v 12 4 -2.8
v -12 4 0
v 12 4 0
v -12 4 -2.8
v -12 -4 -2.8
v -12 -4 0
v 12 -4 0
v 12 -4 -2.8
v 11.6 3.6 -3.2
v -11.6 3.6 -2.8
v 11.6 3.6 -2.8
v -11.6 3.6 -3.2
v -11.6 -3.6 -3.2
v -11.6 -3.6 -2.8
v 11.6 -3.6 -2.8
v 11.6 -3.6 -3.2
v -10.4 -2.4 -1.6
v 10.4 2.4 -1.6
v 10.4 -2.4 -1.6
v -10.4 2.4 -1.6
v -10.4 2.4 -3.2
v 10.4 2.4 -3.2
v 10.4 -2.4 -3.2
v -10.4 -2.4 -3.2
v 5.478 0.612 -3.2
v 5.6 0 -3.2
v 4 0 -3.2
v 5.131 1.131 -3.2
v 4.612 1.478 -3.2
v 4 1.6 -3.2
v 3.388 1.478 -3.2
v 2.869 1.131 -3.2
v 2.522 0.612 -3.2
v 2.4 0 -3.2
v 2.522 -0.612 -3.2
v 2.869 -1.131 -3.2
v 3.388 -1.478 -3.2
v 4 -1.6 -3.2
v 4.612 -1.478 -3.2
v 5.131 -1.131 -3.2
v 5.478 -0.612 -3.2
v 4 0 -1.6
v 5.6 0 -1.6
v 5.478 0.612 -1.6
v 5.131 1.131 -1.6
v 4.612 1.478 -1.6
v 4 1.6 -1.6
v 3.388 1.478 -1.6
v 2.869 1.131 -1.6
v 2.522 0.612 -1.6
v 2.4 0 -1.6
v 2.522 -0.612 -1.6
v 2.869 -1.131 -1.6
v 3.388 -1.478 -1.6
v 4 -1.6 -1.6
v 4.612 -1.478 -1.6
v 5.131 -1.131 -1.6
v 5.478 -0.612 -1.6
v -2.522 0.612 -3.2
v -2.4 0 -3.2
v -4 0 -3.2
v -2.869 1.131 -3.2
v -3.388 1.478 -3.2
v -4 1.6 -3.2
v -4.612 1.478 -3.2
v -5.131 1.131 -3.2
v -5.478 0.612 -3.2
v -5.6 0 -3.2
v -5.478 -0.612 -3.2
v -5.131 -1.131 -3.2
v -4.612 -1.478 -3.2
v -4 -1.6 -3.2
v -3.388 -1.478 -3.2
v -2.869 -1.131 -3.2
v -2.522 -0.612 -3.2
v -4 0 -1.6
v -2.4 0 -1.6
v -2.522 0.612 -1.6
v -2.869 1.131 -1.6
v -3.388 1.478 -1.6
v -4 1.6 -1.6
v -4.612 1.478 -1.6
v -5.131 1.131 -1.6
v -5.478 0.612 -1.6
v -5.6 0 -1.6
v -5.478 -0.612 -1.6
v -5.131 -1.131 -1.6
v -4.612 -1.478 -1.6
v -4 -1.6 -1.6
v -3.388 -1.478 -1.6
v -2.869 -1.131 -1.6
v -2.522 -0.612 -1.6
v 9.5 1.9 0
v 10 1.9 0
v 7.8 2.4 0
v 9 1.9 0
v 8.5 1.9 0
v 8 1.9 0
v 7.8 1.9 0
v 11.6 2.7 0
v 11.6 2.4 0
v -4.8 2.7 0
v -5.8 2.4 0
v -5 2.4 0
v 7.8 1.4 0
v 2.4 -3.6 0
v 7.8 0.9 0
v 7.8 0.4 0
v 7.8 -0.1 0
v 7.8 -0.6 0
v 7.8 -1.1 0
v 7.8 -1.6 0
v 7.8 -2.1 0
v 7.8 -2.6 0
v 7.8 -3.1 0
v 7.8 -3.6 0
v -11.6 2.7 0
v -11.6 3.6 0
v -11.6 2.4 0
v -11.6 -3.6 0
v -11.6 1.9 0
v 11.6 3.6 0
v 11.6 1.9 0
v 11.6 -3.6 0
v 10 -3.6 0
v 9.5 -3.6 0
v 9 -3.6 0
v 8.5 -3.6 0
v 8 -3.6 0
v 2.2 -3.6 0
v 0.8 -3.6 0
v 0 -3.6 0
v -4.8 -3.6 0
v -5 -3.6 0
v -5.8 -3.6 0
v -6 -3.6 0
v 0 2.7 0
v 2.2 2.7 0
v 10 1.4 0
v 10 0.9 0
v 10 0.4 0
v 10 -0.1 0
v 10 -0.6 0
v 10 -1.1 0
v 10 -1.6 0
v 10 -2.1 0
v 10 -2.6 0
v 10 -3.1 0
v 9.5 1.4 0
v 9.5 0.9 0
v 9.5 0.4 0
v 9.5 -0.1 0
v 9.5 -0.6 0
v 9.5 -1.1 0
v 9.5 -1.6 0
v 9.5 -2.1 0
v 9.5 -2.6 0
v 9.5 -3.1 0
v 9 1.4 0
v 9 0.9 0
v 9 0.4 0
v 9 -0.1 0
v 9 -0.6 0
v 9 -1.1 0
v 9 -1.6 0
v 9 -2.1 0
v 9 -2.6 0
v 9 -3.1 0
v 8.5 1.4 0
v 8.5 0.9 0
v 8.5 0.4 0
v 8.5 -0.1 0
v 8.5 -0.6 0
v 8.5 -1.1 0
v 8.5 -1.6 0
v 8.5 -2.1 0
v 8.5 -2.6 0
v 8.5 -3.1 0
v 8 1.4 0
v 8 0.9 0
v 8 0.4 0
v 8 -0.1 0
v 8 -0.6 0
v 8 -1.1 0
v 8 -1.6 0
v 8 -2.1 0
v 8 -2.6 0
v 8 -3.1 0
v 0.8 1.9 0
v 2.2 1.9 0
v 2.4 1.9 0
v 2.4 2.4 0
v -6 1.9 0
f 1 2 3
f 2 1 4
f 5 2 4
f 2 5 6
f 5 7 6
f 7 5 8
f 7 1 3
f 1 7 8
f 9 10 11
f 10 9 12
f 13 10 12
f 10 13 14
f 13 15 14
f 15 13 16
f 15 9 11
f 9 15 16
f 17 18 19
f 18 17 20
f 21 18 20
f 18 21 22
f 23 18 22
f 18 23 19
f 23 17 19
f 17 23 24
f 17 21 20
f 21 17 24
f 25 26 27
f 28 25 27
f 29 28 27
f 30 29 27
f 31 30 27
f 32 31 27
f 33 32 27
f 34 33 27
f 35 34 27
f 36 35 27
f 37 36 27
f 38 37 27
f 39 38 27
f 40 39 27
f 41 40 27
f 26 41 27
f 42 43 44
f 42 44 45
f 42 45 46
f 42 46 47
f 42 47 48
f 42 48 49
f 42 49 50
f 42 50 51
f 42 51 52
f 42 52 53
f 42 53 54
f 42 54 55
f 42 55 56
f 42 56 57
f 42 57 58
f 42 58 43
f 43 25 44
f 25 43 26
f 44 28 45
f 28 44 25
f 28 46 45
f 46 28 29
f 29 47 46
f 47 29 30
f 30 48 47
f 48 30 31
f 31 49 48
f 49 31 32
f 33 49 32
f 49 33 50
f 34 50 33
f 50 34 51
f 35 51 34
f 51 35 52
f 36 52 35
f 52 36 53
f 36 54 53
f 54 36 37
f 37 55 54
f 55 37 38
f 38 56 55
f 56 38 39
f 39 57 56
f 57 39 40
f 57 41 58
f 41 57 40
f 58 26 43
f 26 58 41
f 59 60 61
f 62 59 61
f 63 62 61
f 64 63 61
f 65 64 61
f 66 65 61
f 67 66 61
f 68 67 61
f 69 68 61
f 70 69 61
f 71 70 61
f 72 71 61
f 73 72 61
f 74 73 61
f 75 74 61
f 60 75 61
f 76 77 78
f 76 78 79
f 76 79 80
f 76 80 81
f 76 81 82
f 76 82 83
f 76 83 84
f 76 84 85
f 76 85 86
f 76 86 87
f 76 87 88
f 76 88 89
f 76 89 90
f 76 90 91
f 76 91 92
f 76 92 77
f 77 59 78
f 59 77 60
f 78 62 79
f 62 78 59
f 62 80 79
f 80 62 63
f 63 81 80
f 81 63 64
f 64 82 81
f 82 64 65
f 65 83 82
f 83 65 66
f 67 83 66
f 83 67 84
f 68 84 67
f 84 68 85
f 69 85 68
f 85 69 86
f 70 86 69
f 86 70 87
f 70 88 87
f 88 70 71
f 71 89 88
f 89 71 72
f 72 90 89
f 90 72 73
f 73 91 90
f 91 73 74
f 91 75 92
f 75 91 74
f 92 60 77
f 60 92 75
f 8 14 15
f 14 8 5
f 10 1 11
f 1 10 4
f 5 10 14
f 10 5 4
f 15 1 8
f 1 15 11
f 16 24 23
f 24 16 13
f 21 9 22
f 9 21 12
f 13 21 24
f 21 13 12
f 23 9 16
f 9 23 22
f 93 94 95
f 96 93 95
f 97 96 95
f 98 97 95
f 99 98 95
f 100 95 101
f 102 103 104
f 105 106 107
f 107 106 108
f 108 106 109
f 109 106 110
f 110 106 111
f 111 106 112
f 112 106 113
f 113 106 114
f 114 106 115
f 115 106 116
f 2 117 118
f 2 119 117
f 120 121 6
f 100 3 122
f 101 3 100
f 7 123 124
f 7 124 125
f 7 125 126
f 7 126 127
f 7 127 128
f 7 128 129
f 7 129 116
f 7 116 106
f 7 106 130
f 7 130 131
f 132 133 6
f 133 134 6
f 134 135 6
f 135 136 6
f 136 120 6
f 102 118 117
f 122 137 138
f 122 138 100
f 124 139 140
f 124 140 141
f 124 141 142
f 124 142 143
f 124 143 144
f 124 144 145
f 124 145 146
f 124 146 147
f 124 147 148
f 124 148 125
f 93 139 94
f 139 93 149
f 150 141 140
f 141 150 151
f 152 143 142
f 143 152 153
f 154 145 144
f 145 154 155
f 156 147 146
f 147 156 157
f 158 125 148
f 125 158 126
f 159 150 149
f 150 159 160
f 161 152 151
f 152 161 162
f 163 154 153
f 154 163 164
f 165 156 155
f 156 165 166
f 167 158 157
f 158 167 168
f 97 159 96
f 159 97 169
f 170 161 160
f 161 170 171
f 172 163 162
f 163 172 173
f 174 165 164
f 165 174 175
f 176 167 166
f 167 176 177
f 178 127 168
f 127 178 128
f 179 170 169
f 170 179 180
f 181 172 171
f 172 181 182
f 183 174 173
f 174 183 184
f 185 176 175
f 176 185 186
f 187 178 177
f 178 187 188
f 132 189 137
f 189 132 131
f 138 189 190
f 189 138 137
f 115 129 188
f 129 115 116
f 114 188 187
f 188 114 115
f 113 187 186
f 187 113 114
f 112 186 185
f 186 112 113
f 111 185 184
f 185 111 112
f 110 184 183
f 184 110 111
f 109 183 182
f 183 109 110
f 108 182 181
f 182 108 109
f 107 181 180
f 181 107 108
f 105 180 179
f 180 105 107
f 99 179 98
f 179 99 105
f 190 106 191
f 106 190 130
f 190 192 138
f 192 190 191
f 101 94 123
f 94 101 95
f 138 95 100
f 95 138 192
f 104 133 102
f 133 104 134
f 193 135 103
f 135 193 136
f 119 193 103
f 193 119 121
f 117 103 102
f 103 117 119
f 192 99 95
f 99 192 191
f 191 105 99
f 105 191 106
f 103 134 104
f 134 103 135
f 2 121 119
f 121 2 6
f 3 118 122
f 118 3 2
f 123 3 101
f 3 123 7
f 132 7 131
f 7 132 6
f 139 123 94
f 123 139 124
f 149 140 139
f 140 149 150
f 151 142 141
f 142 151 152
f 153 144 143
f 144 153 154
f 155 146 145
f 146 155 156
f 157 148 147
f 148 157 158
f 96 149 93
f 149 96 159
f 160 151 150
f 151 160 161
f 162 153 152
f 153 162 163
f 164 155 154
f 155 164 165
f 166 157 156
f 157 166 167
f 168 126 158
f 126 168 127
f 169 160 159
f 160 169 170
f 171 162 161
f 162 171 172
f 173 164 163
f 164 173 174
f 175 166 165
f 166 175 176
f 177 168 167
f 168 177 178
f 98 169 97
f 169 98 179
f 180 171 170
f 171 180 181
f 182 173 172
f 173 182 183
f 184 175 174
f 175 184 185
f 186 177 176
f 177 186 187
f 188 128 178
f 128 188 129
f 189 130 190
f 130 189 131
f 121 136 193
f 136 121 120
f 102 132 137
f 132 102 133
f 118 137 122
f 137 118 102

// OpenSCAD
// file: ../p/4-4edge.scad
use <../lib.scad>
function ldraw_lib__4_4edge() = [
// 0 Circle 1.0
// 0 Name: 4-4edge.dat
// 0 Author: James Jessiman
// 0 !LDRAW_ORG Primitive UPDATE 2017-01
// 0 !LICENSE Licensed under CC BY 2.0 and CC BY 4.0 : see CAreadme.txt
// 
// 0 BFC CERTIFY CCW
  [0,"BFC","CERTIFY"],
  [0,"BFC","CCW"],
// 
// 0 !HISTORY 1998-12-15 [PTadmin] Official Update 1998-10
// 0 !HISTORY 2005-12-28 [PTadmin] Official Update 2005-01
// 0 !HISTORY 2007-06-24 [PTadmin] Header formatted for Contributor Agreement
// 0 !HISTORY 2008-07-01 [PTadmin] Official Update 2008-01
// 0 !HISTORY 2017-01-15 [Steffen] BFCed
// 0 !HISTORY 2017-12-30 [PTadmin] Official Update 2017-01
// 
// 
// 2 24 1 0 0 0.9239 0 0.3827
  [2,24,1,0,0,0.9239,0,0.3827],
// 2 24 0.9239 0 0.3827 0.7071 0 0.7071
  [2,24,0.9239,0,0.3827,0.7071,0,0.7071],
// 2 24 0.7071 0 0.7071 0.3827 0 0.9239
  [2,24,0.7071,0,0.7071,0.3827,0,0.9239],
// 2 24 0.3827 0 0.9239 0 0 1
  [2,24,0.3827,0,0.9239,0,0,1],
// 2 24 0 0 1 -0.3827 0 0.9239
  [2,24,0,0,1,-0.3827,0,0.9239],
// 2 24 -0.3827 0 0.9239 -0.7071 0 0.7071
  [2,24,-0.3827,0,0.9239,-0.7071,0,0.7071],
// 2 24 -0.7071 0 0.7071 -0.9239 0 0.3827
  [2,24,-0.7071,0,0.7071,-0.9239,0,0.3827],
// 2 24 -0.9239 0 0.3827 -1 0 -0
  [2,24,-0.9239,0,0.3827,-1,0,-0],
// 2 24 -1 0 -0 -0.9239 0 -0.3827
  [2,24,-1,0,-0,-0.9239,0,-0.3827],
// 2 24 -0.9239 0 -0.3827 -0.7071 0 -0.7071
  [2,24,-0.9239,0,-0.3827,-0.7071,0,-0.7071],
// 2 24 -0.7071 0 -0.7071 -0.3827 0 -0.9239
  [2,24,-0.7071,0,-0.7071,-0.3827,0,-0.9239],
// 2 24 -0.3827 0 -0.9239 0 0 -1
  [2,24,-0.3827,0,-0.9239,0,0,-1],
// 2 24 0 0 -1 0.3827 0 -0.9239
  [2,24,0,0,-1,0.3827,0,-0.9239],
// 2 24 0.3827 0 -0.9239 0.7071 0 -0.7071
  [2,24,0.3827,0,-0.9239,0.7071,0,-0.7071],
// 2 24 0.7071 0 -0.7071 0.9239 0 -0.3827
  [2,24,0.7071,0,-0.7071,0.9239,0,-0.3827],
// 2 24 0.9239 0 -0.3827 1 0 0
  [2,24,0.9239,0,-0.3827,1,0,0],
];
module ldraw_lib__4_4edge(step=0, col=false, unit=2/5, alt=false, line=0.2, solid=!$preview)
    makepoly(ldraw_lib__4_4edge(), step=step, col=col, unit=unit, alt=alt, line=line, solid=solid);
ldraw_lib__4_4edge(line=0.2);
// file: ../p/4-4disc.scad
use <../lib.scad>
function ldraw_lib__4_4disc() = [
// 0 Disc 1.0
// 0 Name: 4-4disc.dat
// 0 Author: James Jessiman
// 0 !LDRAW_ORG Primitive UPDATE 2002-02
// 0 !LICENSE Licensed under CC BY 2.0 and CC BY 4.0 : see CAreadme.txt
// 
// 0 BFC CERTIFY CCW
  [0,"BFC","CERTIFY"],
  [0,"BFC","CCW"],
// 
// 0 !HISTORY 1998-12-15 [PTadmin] Official Update 1998-10
// 0 !HISTORY 2002-03-23 [sbliss] Added BFC statement
// 0 !HISTORY 2002-04-25 [PTadmin] Official Update 2002-02
// 0 !HISTORY 2007-06-24 [PTadmin] Header formatted for Contributor Agreement
// 0 !HISTORY 2008-07-01 [PTadmin] Official Update 2008-01
// 
// 
// 3 16 0 0 0 1 0 0 0.9239 0 0.3827
  [3,16,0,0,0,1,0,0,0.9239,0,0.3827],
// 3 16 0 0 0 0.9239 0 0.3827 0.7071 0 0.7071
  [3,16,0,0,0,0.9239,0,0.3827,0.7071,0,0.7071],
// 3 16 0 0 0 0.7071 0 0.7071 0.3827 0 0.9239
  [3,16,0,0,0,0.7071,0,0.7071,0.3827,0,0.9239],
// 3 16 0 0 0 0.3827 0 0.9239 0 0 1
  [3,16,0,0,0,0.3827,0,0.9239,0,0,1],
// 3 16 0 0 0 0 0 1 -0.3827 0 0.9239
  [3,16,0,0,0,0,0,1,-0.3827,0,0.9239],
// 3 16 0 0 0 -0.3827 0 0.9239 -0.7071 0 0.7071
  [3,16,0,0,0,-0.3827,0,0.9239,-0.7071,0,0.7071],
// 3 16 0 0 0 -0.7071 0 0.7071 -0.9239 0 0.3827
  [3,16,0,0,0,-0.7071,0,0.7071,-0.9239,0,0.3827],
// 3 16 0 0 0 -0.9239 0 0.3827 -1 0 -0
  [3,16,0,0,0,-0.9239,0,0.3827,-1,0,-0],
// 3 16 0 0 0 -1 0 -0 -0.9239 0 -0.3827
  [3,16,0,0,0,-1,0,-0,-0.9239,0,-0.3827],
// 3 16 0 0 0 -0.9239 0 -0.3827 -0.7071 0 -0.7071
  [3,16,0,0,0,-0.9239,0,-0.3827,-0.7071,0,-0.7071],
// 3 16 0 0 0 -0.7071 0 -0.7071 -0.3827 0 -0.9239
  [3,16,0,0,0,-0.7071,0,-0.7071,-0.3827,0,-0.9239],
// 3 16 0 0 0 -0.3827 0 -0.9239 0 0 -1
  [3,16,0,0,0,-0.3827,0,-0.9239,0,0,-1],
// 3 16 0 0 0 0 0 -1 0.3827 0 -0.9239
  [3,16,0,0,0,0,0,-1,0.3827,0,-0.9239],
// 3 16 0 0 0 0.3827 0 -0.9239 0.7071 0 -0.7071
  [3,16,0,0,0,0.3827,0,-0.9239,0.7071,0,-0.7071],
// 3 16 0 0 0 0.7071 0 -0.7071 0.9239 0 -0.3827
  [3,16,0,0,0,0.7071,0,-0.7071,0.9239,0,-0.3827],
// 3 16 0 0 0 0.9239 0 -0.3827 1 0 0
  [3,16,0,0,0,0.9239,0,-0.3827,1,0,0],
// 0
];
module ldraw_lib__4_4disc(step=0, col=false, unit=2/5, alt=false, line=0.2, solid=!$preview)
    makepoly(ldraw_lib__4_4disc(), step=step, col=col, unit=unit, alt=alt, line=line, solid=solid);
ldraw_lib__4_4disc(line=0.2);
// file: ../p/4-4cyli.scad
use <../lib.scad>
$fa=1; $fs=0.2;
function ldraw_lib__4_4cyli(realsolid=false) = [
// 0 Cylinder 1.0
// 0 Name: 4-4cyli.dat
// 0 Author: James Jessiman
// 0 !LDRAW_ORG Primitive UPDATE 2005-01
// 0 !LICENSE Licensed under CC BY 2.0 and CC BY 4.0 : see CAreadme.txt
// 
// 0 BFC CERTIFY CCW
  [0,"BFC","CERTIFY"],
  [0,"BFC","CCW"],
// 
// 0 !HISTORY 1998-12-15 [PTadmin] Official Update 1998-10
// 0 !HISTORY 2002-03-23 [sbliss] Added BFC statement; merged headers from files in distributions LDraw 0.27 and Complete.
// 0 !HISTORY 2002-04-25 [PTadmin] Official Update 2002-02
// 0 !HISTORY 2004-12-14 [guyvivan] BFC CCW
// 0 !HISTORY 2005-12-28 [PTadmin] Official Update 2005-01
// 0 !HISTORY 2007-06-24 [PTadmin] Header formatted for Contributor Agreement
// 0 !HISTORY 2008-07-01 [PTadmin] Official Update 2008-01
// 
// 
// 4 16 1 1 0 0.9239 1 0.3827 0.9239 0 0.3827 1 0 0
  [4,16,1,1,0,0.9239,1,0.3827,0.9239,0,0.3827,1,0,0],
// 5 24 1 0 0 1 1 0 0.9239 0 0.3827 0.9239 0 -0.3827
  [5,24,1,0,0,1,1,0,0.9239,0,0.3827,0.9239,0,-0.3827],
// 4 16 0.9239 1 0.3827 0.7071 1 0.7071 0.7071 0 0.7071 0.9239 0 0.3827
  [4,16,0.9239,1,0.3827,0.7071,1,0.7071,0.7071,0,0.7071,0.9239,0,0.3827],
// 5 24 0.9239 0 0.3827 0.9239 1 0.3827 0.7071 0 0.7071 1 0 0
  [5,24,0.9239,0,0.3827,0.9239,1,0.3827,0.7071,0,0.7071,1,0,0],
// 4 16 0.7071 1 0.7071 0.3827 1 0.9239 0.3827 0 0.9239 0.7071 0 0.7071
  [4,16,0.7071,1,0.7071,0.3827,1,0.9239,0.3827,0,0.9239,0.7071,0,0.7071],
// 5 24 0.7071 0 0.7071 0.7071 1 0.7071 0.3827 0 0.9239 0.9239 0 0.3827
  [5,24,0.7071,0,0.7071,0.7071,1,0.7071,0.3827,0,0.9239,0.9239,0,0.3827],
// 4 16 0.3827 1 0.9239 0 1 1 0 0 1 0.3827 0 0.9239
  [4,16,0.3827,1,0.9239,0,1,1,0,0,1,0.3827,0,0.9239],
// 5 24 0.3827 0 0.9239 0.3827 1 0.9239 0 0 1 0.7071 0 0.7071
  [5,24,0.3827,0,0.9239,0.3827,1,0.9239,0,0,1,0.7071,0,0.7071],
// 4 16 0 1 1 -0.3827 1 0.9239 -0.3827 0 0.9239 0 0 1
  [4,16,0,1,1,-0.3827,1,0.9239,-0.3827,0,0.9239,0,0,1],
// 5 24 0 0 1 0 1 1 -0.3827 0 0.9239 0.3827 0 0.9239
  [5,24,0,0,1,0,1,1,-0.3827,0,0.9239,0.3827,0,0.9239],
// 4 16 -0.3827 1 0.9239 -0.7071 1 0.7071 -0.7071 0 0.7071 -0.3827 0 0.9239
  [4,16,-0.3827,1,0.9239,-0.7071,1,0.7071,-0.7071,0,0.7071,-0.3827,0,0.9239],
// 5 24 -0.3827 0 0.9239 -0.3827 1 0.9239 -0.7071 0 0.7071 0 0 1
  [5,24,-0.3827,0,0.9239,-0.3827,1,0.9239,-0.7071,0,0.7071,0,0,1],
// 4 16 -0.7071 1 0.7071 -0.9239 1 0.3827 -0.9239 0 0.3827 -0.7071 0 0.7071
  [4,16,-0.7071,1,0.7071,-0.9239,1,0.3827,-0.9239,0,0.3827,-0.7071,0,0.7071],
// 5 24 -0.7071 0 0.7071 -0.7071 1 0.7071 -0.9239 0 0.3827 -0.3827 0 0.9239
  [5,24,-0.7071,0,0.7071,-0.7071,1,0.7071,-0.9239,0,0.3827,-0.3827,0,0.9239],
// 4 16 -0.9239 1 0.3827 -1 1 0 -1 0 0 -0.9239 0 0.3827
  [4,16,-0.9239,1,0.3827,-1,1,0,-1,0,0,-0.9239,0,0.3827],
// 5 24 -0.9239 0 0.3827 -0.9239 1 0.3827 -1 0 0 -0.7071 0 0.7071
  [5,24,-0.9239,0,0.3827,-0.9239,1,0.3827,-1,0,0,-0.7071,0,0.7071],
// 4 16 -1 1 0 -0.9239 1 -0.3827 -0.9239 0 -0.3827 -1 0 0
  [4,16,-1,1,0,-0.9239,1,-0.3827,-0.9239,0,-0.3827,-1,0,0],
// 5 24 -1 0 0 -1 1 0 -0.9239 0 -0.3827 -0.9239 0 0.3827
  [5,24,-1,0,0,-1,1,0,-0.9239,0,-0.3827,-0.9239,0,0.3827],
// 4 16 -0.9239 1 -0.3827 -0.7071 1 -0.7071 -0.7071 0 -0.7071 -0.9239 0 -0.3827
  [4,16,-0.9239,1,-0.3827,-0.7071,1,-0.7071,-0.7071,0,-0.7071,-0.9239,0,-0.3827],
// 5 24 -0.9239 0 -0.3827 -0.9239 1 -0.3827 -0.7071 0 -0.7071 -1 0 0
  [5,24,-0.9239,0,-0.3827,-0.9239,1,-0.3827,-0.7071,0,-0.7071,-1,0,0],
// 4 16 -0.7071 1 -0.7071 -0.3827 1 -0.9239 -0.3827 0 -0.9239 -0.7071 0 -0.7071
  [4,16,-0.7071,1,-0.7071,-0.3827,1,-0.9239,-0.3827,0,-0.9239,-0.7071,0,-0.7071],
// 5 24 -0.7071 0 -0.7071 -0.7071 1 -0.7071 -0.3827 0 -0.9239 -0.9239 0 -0.3827
  [5,24,-0.7071,0,-0.7071,-0.7071,1,-0.7071,-0.3827,0,-0.9239,-0.9239,0,-0.3827],
// 4 16 -0.3827 1 -0.9239 0 1 -1 0 0 -1 -0.3827 0 -0.9239
  [4,16,-0.3827,1,-0.9239,0,1,-1,0,0,-1,-0.3827,0,-0.9239],
// 5 24 -0.3827 0 -0.9239 -0.3827 1 -0.9239 0 0 -1 -0.7071 0 -0.7071
  [5,24,-0.3827,0,-0.9239,-0.3827,1,-0.9239,0,0,-1,-0.7071,0,-0.7071],
// 4 16 0 1 -1 0.3827 1 -0.9239 0.3827 0 -0.9239 0 0 -1
  [4,16,0,1,-1,0.3827,1,-0.9239,0.3827,0,-0.9239,0,0,-1],
// 5 24 0 0 -1 0 1 -1 0.3827 0 -0.9239 -0.3827 0 -0.9239
  [5,24,0,0,-1,0,1,-1,0.3827,0,-0.9239,-0.3827,0,-0.9239],
// 4 16 0.3827 1 -0.9239 0.7071 1 -0.7071 0.7071 0 -0.7071 0.3827 0 -0.9239
  [4,16,0.3827,1,-0.9239,0.7071,1,-0.7071,0.7071,0,-0.7071,0.3827,0,-0.9239],
// 5 24 0.3827 0 -0.9239 0.3827 1 -0.9239 0.7071 0 -0.7071 0 0 -1
  [5,24,0.3827,0,-0.9239,0.3827,1,-0.9239,0.7071,0,-0.7071,0,0,-1],
// 4 16 0.7071 1 -0.7071 0.9239 1 -0.3827 0.9239 0 -0.3827 0.7071 0 -0.7071
  [4,16,0.7071,1,-0.7071,0.9239,1,-0.3827,0.9239,0,-0.3827,0.7071,0,-0.7071],
// 5 24 0.7071 0 -0.7071 0.7071 1 -0.7071 0.9239 0 -0.3827 0.3827 0 -0.9239
  [5,24,0.7071,0,-0.7071,0.7071,1,-0.7071,0.9239,0,-0.3827,0.3827,0,-0.9239],
// 4 16 0.9239 1 -0.3827 1 1 0 1 0 0 0.9239 0 -0.3827
  [4,16,0.9239,1,-0.3827,1,1,0,1,0,0,0.9239,0,-0.3827],
// 5 24 0.9239 0 -0.3827 0.9239 1 -0.3827 1 0 0 0.7071 0 -0.7071
  [5,24,0.9239,0,-0.3827,0.9239,1,-0.3827,1,0,0,0.7071,0,-0.7071],
// 0
];
module ldraw_lib__4_4cyli(step=0, col=false, unit=2/5, alt=false, line=0.2, solid=!$preview)
    makepoly(ldraw_lib__4_4cyli(solid), step=step, col=col, unit=unit, alt=alt, line=line, solid=solid);
ldraw_lib__4_4cyli(line=0.2);
// file: ../p/stud3.scad
use <../lib.scad>
use <4-4cyli.scad>
use <4-4disc.scad>
use <4-4edge.scad>
function ldraw_lib__stud3() = [
// 0 Stud Tube Solid
// 0 Name: stud3.dat
// 0 Author: James Jessiman
// 0 !LDRAW_ORG Primitive UPDATE 2012-01
// 0 !LICENSE Licensed under CC BY 4.0 : see CAreadme.txt
// 
// 0 BFC CERTIFY CCW
  [0,"BFC","CERTIFY"],
  [0,"BFC","CCW"],
// 
// 0 !HISTORY 2002-04-04 [sbliss] Modified for BFC compliance
// 0 !HISTORY 2002-04-25 [PTadmin] Official Update 2002-02
// 0 !HISTORY 2007-06-24 [PTadmin] Header formatted for Contributor Agreement
// 0 !HISTORY 2008-07-01 [PTadmin] Official Update 2008-01
// 0 !HISTORY 2012-02-16 [Philo] Changed to CCW
// 0 !HISTORY 2012-03-30 [PTadmin] Official Update 2012-01
// 
// 
// 1 16 0 -4 0 4 0 0 0 1 0 0 0 4 4-4edge.dat
  [1,16,0,-4,0,4,0,0,0,1,0,0,0,4, ldraw_lib__4_4edge()],
// 1 16 0 0 0 4 0 0 0 1 0 0 0 4 4-4edge.dat
  [1,16,0,0,0,4,0,0,0,1,0,0,0,4, ldraw_lib__4_4edge()],
// 1 16 0 -4 0 4 0 0 0 1 0 0 0 4 4-4disc.dat
  [1,16,0,-4,0,4,0,0,0,1,0,0,0,4, ldraw_lib__4_4disc()],
  [-1,16,0,0,0,4,0,0,0,-1,0,0,0,4, ldraw_lib__4_4disc()],
// 1 16 0 -4 0 4 0 0 0 4 0 0 0 4 4-4cyli.dat
  [1,16,0,-4,0,4,0,0,0,4,0,0,0,4, ldraw_lib__4_4cyli()],
];
module ldraw_lib__stud3(step=0, col=false, unit=2/5, alt=false, line=0.2, solid=!$preview)
    makepoly(ldraw_lib__stud3(), step=step, col=col, unit=unit, alt=alt, line=line, solid=solid);
ldraw_lib__stud3(line=0.2);
// file: ../p/box5.scad
use <../lib.scad>
function ldraw_lib__box5() = [
// 0 Box with 5 Faces and All Edges
// 0 Name: box5.dat
// 0 Author: James Jessiman
// 0 !LDRAW_ORG Primitive UPDATE 2012-01
// 0 !LICENSE Licensed under CC BY 2.0 and CC BY 4.0 : see CAreadme.txt
// 
// 0 BFC CERTIFY CCW
  [0,"BFC","CERTIFY"],
  [0,"BFC","CCW"],
// 
// 0 !HISTORY 2002-04-03 [sbliss] Modified for BFC compliance
// 0 !HISTORY 2002-04-25 [PTadmin] Official Update 2002-02
// 0 !HISTORY 2007-06-24 [PTadmin] Header formatted for Contributor Agreement
// 0 !HISTORY 2008-07-01 [PTadmin] Official Update 2008-01
// 0 !HISTORY 2012-02-16 [Philo] Changed to CCW
// 0 !HISTORY 2012-03-30 [PTadmin] Official Update 2012-01
// 
// 
// 2 24 1 1 1 -1 1 1
  [2,24,1,1,1,-1,1,1],
// 2 24 -1 1 1 -1 1 -1
  [2,24,-1,1,1,-1,1,-1],
// 2 24 -1 1 -1 1 1 -1
  [2,24,-1,1,-1,1,1,-1],
// 2 24 1 1 -1 1 1 1
  [2,24,1,1,-1,1,1,1],
// 2 24 1 0 1 -1 0 1
  [2,24,1,0,1,-1,0,1],
// 2 24 -1 0 1 -1 0 -1
  [2,24,-1,0,1,-1,0,-1],
// 2 24 -1 0 -1 1 0 -1
  [2,24,-1,0,-1,1,0,-1],
// 2 24 1 0 -1 1 0 1
  [2,24,1,0,-1,1,0,1],
// 2 24 1 0 1 1 1 1
  [2,24,1,0,1,1,1,1],
// 2 24 -1 0 1 -1 1 1
  [2,24,-1,0,1,-1,1,1],
// 2 24 1 0 -1 1 1 -1
  [2,24,1,0,-1,1,1,-1],
// 2 24 -1 0 -1 -1 1 -1
  [2,24,-1,0,-1,-1,1,-1],
// 4 16 -1 1 1 1 1 1 1 1 -1 -1 1 -1
  [4,16,-1,1,1,1,1,1,1,1,-1,-1,1,-1],
// 4 16 -1 1 1 -1 0 1 1 0 1 1 1 1
  [4,16,-1,1,1,-1,0,1,1,0,1,1,1,1],
// 4 16 -1 1 -1 -1 0 -1 -1 0 1 -1 1 1
  [4,16,-1,1,-1,-1,0,-1,-1,0,1,-1,1,1],
// 4 16 1 1 -1 1 0 -1 -1 0 -1 -1 1 -1
  [4,16,1,1,-1,1,0,-1,-1,0,-1,-1,1,-1],
// 4 16 1 1 1 1 0 1 1 0 -1 1 1 -1
  [4,16,1,1,1,1,0,1,1,0,-1,1,1,-1],
];
makepoly(ldraw_lib__box5(), line=0.2);
// file: ../p/box4.scad
use <../lib.scad>
function ldraw_lib__box4() = [
// 0 Box with 4 Faces (2 Parallel Pairs) and All Edges
// 0 Name: box4.dat
// 0 Author: James Jessiman
// 0 !LDRAW_ORG Primitive UPDATE 2012-01
// 0 !LICENSE Licensed under CC BY 4.0 : see CAreadme.txt
// 
// 0 BFC CERTIFY CCW
  [0,"BFC","CERTIFY"],
  [0,"BFC","CCW"],
// 
// 0 !HISTORY 2002-04-03 [sbliss] Modified for BFC compliance
// 0 !HISTORY 2002-04-25 [PTadmin] Official Update 2002-02
// 0 !HISTORY 2007-06-24 [PTadmin] Header formatted for Contributor Agreement
// 0 !HISTORY 2008-07-01 [PTadmin] Official Update 2008-01
// 0 !HISTORY 2012-02-16 [Philo] Changed to CCW
// 0 !HISTORY 2012-03-30 [PTadmin] Official Update 2012-01
// 
// 
// 2 24 1 1 1 -1 1 1
  [2,24,1,1,1,-1,1,1],
// 2 24 -1 1 1 -1 1 -1
  [2,24,-1,1,1,-1,1,-1],
// 2 24 -1 1 -1 1 1 -1
  [2,24,-1,1,-1,1,1,-1],
// 2 24 1 1 -1 1 1 1
  [2,24,1,1,-1,1,1,1],
// 2 24 1 0 1 -1 0 1
  [2,24,1,0,1,-1,0,1],
// 2 24 -1 0 1 -1 0 -1
  [2,24,-1,0,1,-1,0,-1],
// 2 24 -1 0 -1 1 0 -1
  [2,24,-1,0,-1,1,0,-1],
// 2 24 1 0 -1 1 0 1
  [2,24,1,0,-1,1,0,1],
// 2 24 1 0 1 1 1 1
  [2,24,1,0,1,1,1,1],
// 2 24 -1 0 1 -1 1 1
  [2,24,-1,0,1,-1,1,1],
// 2 24 1 0 -1 1 1 -1
  [2,24,1,0,-1,1,1,-1],
// 2 24 -1 0 -1 -1 1 -1
  [2,24,-1,0,-1,-1,1,-1],
// 4 16 -1 1 1 -1 0 1 1 0 1 1 1 1
  [4,16,-1,1,1,-1,0,1,1,0,1,1,1,1],
// 4 16 -1 1 -1 -1 0 -1 -1 0 1 -1 1 1
  [4,16,-1,1,-1,-1,0,-1,-1,0,1,-1,1,1],
// 4 16 1 1 -1 1 0 -1 -1 0 -1 -1 1 -1
  [4,16,1,1,-1,1,0,-1,-1,0,-1,-1,1,-1],
// 4 16 1 1 1 1 0 1 1 0 -1 1 1 -1
  [4,16,1,1,1,1,0,1,1,0,-1,1,1,-1],
];
module ldraw_lib__box4(step=0, col=false, unit=2/5, alt=false, line=0.2, solid=!$preview)
    makepoly(ldraw_lib__box4(), step=step, col=col, unit=unit, alt=alt, line=line, solid=solid);
ldraw_lib__box4(line=0.2);
// file: s/63864s01.scad
use <../../lib.scad>
use <../../p/box4.scad>
use <../../p/box5.scad>
use <../../p/stud3.scad>
function ldraw_lib__s__63864s01() = [
// 0 ~Tile  1 x  3 without Top Face
// 0 Name: s\63864s01.dat
// 0 Author: Ulrich Röder [UR]
// 0 !LDRAW_ORG Subpart UPDATE 2019-01
// 0 !LICENSE Licensed under CC BY 4.0 : see CAreadme.txt
// 
// 0 BFC CERTIFY CCW
  [0,"BFC","CERTIFY"],
  [0,"BFC","CCW"],
// 
// 0 !HISTORY 2019-06-28 [PTadmin] Official Update 2019-01
// 
// 
// 1 16 0 0 0 30 0 0 0 7 0 0 0 10 box4.dat
  [1,16,0,0,0,30,0,0,0,7,0,0,0,10, ldraw_lib__box4()],
// 1 16 0 7 0 29 0 0 0 1 0 0 0 9 box4.dat
  [1,16,0,7,0,29,0,0,0,1,0,0,0,9, ldraw_lib__box4()],
// 0 BFC INVERTNEXT
  [0,"BFC","INVERTNEXT"],
// 1 16 0 8 0 -26 0 0 0 -4 0 0 0 6 box5.dat
  [1,16,0,8,0,-26,0,0,0,-4,0,0,0,6, ldraw_lib__box5()],
// 1 16 10 4 0 1 0 0 0 -1 0 0 0 1 stud3.dat
  [1,16,10,4,0,1,0,0,0,-1,0,0,0,1, ldraw_lib__stud3()],
// 1 16 -10 4 0 1 0 0 0 -1 0 0 0 1 stud3.dat
  [1,16,-10,4,0,1,0,0,0,-1,0,0,0,1, ldraw_lib__stud3()],
// 4 16 -30 7 -10 -29 7 -9 29 7 -9 30 7 -10
  [4,16,-30,7,-10,-29,7,-9,29,7,-9,30,7,-10],
// 4 16 30 7 10 29 7 9 -29 7 9 -30 7 10
  [4,16,30,7,10,29,7,9,-29,7,9,-30,7,10],
// 4 16 -30 7 -10 -30 7 10 -29 7 9 -29 7 -9
  [4,16,-30,7,-10,-30,7,10,-29,7,9,-29,7,-9],
// 4 16 30 7 10 30 7 -10 29 7 -9 29 7 9
  [4,16,30,7,10,30,7,-10,29,7,-9,29,7,9],
// 4 16 -29 8 -9 -26 8 -6 26 8 -6 29 8 -9
  [4,16,-29,8,-9,-26,8,-6,26,8,-6,29,8,-9],
// 4 16 29 8 9 26 8 6 -26 8 6 -29 8 9
  [4,16,29,8,9,26,8,6,-26,8,6,-29,8,9],
// 4 16 -29 8 -9 -29 8 9 -26 8 6 -26 8 -6
  [4,16,-29,8,-9,-29,8,9,-26,8,6,-26,8,-6],
// 4 16 29 8 9 29 8 -9 26 8 -6 26 8 6
  [4,16,29,8,9,29,8,-9,26,8,-6,26,8,6],
];
module ldraw_lib__s__63864s01(step=0, col=false, unit=2/5, alt=false, line=0.2, solid=!$preview)
    makepoly(ldraw_lib__s__63864s01(), step=step, col=col, unit=unit, alt=alt, line=line, solid=solid);
ldraw_lib__s__63864s01(line=0.2);
// main file
use <../lib.scad>
use <s/63864s01.scad>
function ldraw_lib__63864p08() = [
// 0 Tile  1 x  3 with Super Mario Pixelated Pipe Pattern
// 0 Name: 63864p08.dat
// 0 Author: Florent Faramond [Makou]
// 0 !LDRAW_ORG Part UPDATE 2025-03
// 0 !LICENSE Licensed under CC BY 4.0 : see CAreadme.txt
// 
// 0 BFC CERTIFY CCW
  [0,"BFC","CERTIFY"],
  [0,"BFC","CCW"],
// 
// 0 !KEYWORDS Bricklink 63864pb116, Rebrickable 63864pr0035, Set 71374
// 
// 0 !HISTORY 2025-03-30 [OrionP] Official Update 2025-03
// 
// 1 16 0 0 0 1 0 0 0 1 0 0 0 1 s\63864s01.dat
  [1,16,0,0,0,1,0,0,0,1,0,0,0,1, ldraw_lib__s__63864s01()],
// 
// 3 2 23.75 0 4.75 25 0 4.75 19.5 0 6
  [3,2,23.75,0,4.75,25,0,4.75,19.5,0,6],
// 3 2 22.5 0 4.75 23.75 0 4.75 19.5 0 6
  [3,2,22.5,0,4.75,23.75,0,4.75,19.5,0,6],
// 3 2 21.25 0 4.75 22.5 0 4.75 19.5 0 6
  [3,2,21.25,0,4.75,22.5,0,4.75,19.5,0,6],
// 3 2 20 0 4.75 21.25 0 4.75 19.5 0 6
  [3,2,20,0,4.75,21.25,0,4.75,19.5,0,6],
// 3 2 19.5 0 4.75 20 0 4.75 19.5 0 6
  [3,2,19.5,0,4.75,20,0,4.75,19.5,0,6],
// 3 2 29 0 6.75 19.5 0 6 29 0 6
  [3,2,29,0,6.75,19.5,0,6,29,0,6],
// 3 2 -12 0 6.75 -14.5 0 6 -12.5 0 6
  [3,2,-12,0,6.75,-14.5,0,6,-12.5,0,6],
// 3 10 19.5 0 3.5 6 0 -9 19.5 0 2.25
  [3,10,19.5,0,3.5,6,0,-9,19.5,0,2.25],
// 3 10 19.5 0 2.25 6 0 -9 19.5 0 1
  [3,10,19.5,0,2.25,6,0,-9,19.5,0,1],
// 3 10 19.5 0 1 6 0 -9 19.5 0 -0.25
  [3,10,19.5,0,1,6,0,-9,19.5,0,-0.25],
// 3 10 19.5 0 -0.25 6 0 -9 19.5 0 -1.5
  [3,10,19.5,0,-0.25,6,0,-9,19.5,0,-1.5],
// 3 10 19.5 0 -1.5 6 0 -9 19.5 0 -2.75
  [3,10,19.5,0,-1.5,6,0,-9,19.5,0,-2.75],
// 3 10 19.5 0 -2.75 6 0 -9 19.5 0 -4
  [3,10,19.5,0,-2.75,6,0,-9,19.5,0,-4],
// 3 10 19.5 0 -4 6 0 -9 19.5 0 -5.25
  [3,10,19.5,0,-4,6,0,-9,19.5,0,-5.25],
// 3 10 19.5 0 -5.25 6 0 -9 19.5 0 -6.5
  [3,10,19.5,0,-5.25,6,0,-9,19.5,0,-6.5],
// 3 10 19.5 0 -6.5 6 0 -9 19.5 0 -7.75
  [3,10,19.5,0,-6.5,6,0,-9,19.5,0,-7.75],
// 3 10 19.5 0 -7.75 6 0 -9 19.5 0 -9
  [3,10,19.5,0,-7.75,6,0,-9,19.5,0,-9],
// 3 16 -30 0 10 -29 0 6.75 -29 0 9
  [3,16,-30,0,10,-29,0,6.75,-29,0,9],
// 3 16 -30 0 10 -29 0 6 -29 0 6.75
  [3,16,-30,0,10,-29,0,6,-29,0,6.75],
// 3 16 -29 0 -9 -29 0 4.75 -30 0 -10
  [3,16,-29,0,-9,-29,0,4.75,-30,0,-10],
// 3 16 29 0 6.75 30 0 10 29 0 9
  [3,16,29,0,6.75,30,0,10,29,0,9],
// 3 16 29 0 6 30 0 10 29 0 6.75
  [3,16,29,0,6,30,0,10,29,0,6.75],
// 3 16 30 0 -10 29 0 4.75 29 0 -9
  [3,16,30,0,-10,29,0,4.75,29,0,-9],
// 3 16 30 0 -10 29 0 -9 25 0 -9
  [3,16,30,0,-10,29,0,-9,25,0,-9],
// 3 16 30 0 -10 25 0 -9 23.75 0 -9
  [3,16,30,0,-10,25,0,-9,23.75,0,-9],
// 3 16 30 0 -10 23.75 0 -9 22.5 0 -9
  [3,16,30,0,-10,23.75,0,-9,22.5,0,-9],
// 3 16 30 0 -10 22.5 0 -9 21.25 0 -9
  [3,16,30,0,-10,22.5,0,-9,21.25,0,-9],
// 3 16 30 0 -10 21.25 0 -9 20 0 -9
  [3,16,30,0,-10,21.25,0,-9,20,0,-9],
// 3 16 30 0 -10 20 0 -9 19.5 0 -9
  [3,16,30,0,-10,20,0,-9,19.5,0,-9],
// 3 16 30 0 -10 19.5 0 -9 6 0 -9
  [3,16,30,0,-10,19.5,0,-9,6,0,-9],
// 3 16 30 0 -10 6 0 -9 5.5 0 -9
  [3,16,30,0,-10,6,0,-9,5.5,0,-9],
// 3 16 30 0 -10 5.5 0 -9 2 0 -9
  [3,16,30,0,-10,5.5,0,-9,2,0,-9],
// 3 16 0 0 -9 -12 0 -9 -30 0 -10
  [3,16,0,0,-9,-12,0,-9,-30,0,-10],
// 3 16 -12 0 -9 -12.5 0 -9 -30 0 -10
  [3,16,-12,0,-9,-12.5,0,-9,-30,0,-10],
// 3 16 -12.5 0 -9 -14.5 0 -9 -30 0 -10
  [3,16,-12.5,0,-9,-14.5,0,-9,-30,0,-10],
// 3 16 -14.5 0 -9 -15 0 -9 -30 0 -10
  [3,16,-14.5,0,-9,-15,0,-9,-30,0,-10],
// 3 16 -15 0 -9 -29 0 -9 -30 0 -10
  [3,16,-15,0,-9,-29,0,-9,-30,0,-10],
// 3 27 -12 0 6.75 -29 0 9 -29 0 6.75
  [3,27,-12,0,6.75,-29,0,9,-29,0,6.75],
// 3 27 29 0 9 0 0 6.75 5.5 0 6.75
  [3,27,29,0,9,0,0,6.75,5.5,0,6.75],
// 3 27 29 0 9 5.5 0 6.75 29 0 6.75
  [3,27,29,0,9,5.5,0,6.75,29,0,6.75],
// 3 27 29 0 -9 25 0 3.5 25 0 2.25
  [3,27,29,0,-9,25,0,3.5,25,0,2.25],
// 3 27 29 0 -9 25 0 2.25 25 0 1
  [3,27,29,0,-9,25,0,2.25,25,0,1],
// 3 27 29 0 -9 25 0 1 25 0 -0.25
  [3,27,29,0,-9,25,0,1,25,0,-0.25],
// 3 27 29 0 -9 25 0 -0.25 25 0 -1.5
  [3,27,29,0,-9,25,0,-0.25,25,0,-1.5],
// 3 27 29 0 -9 25 0 -1.5 25 0 -2.75
  [3,27,29,0,-9,25,0,-1.5,25,0,-2.75],
// 3 27 29 0 -9 25 0 -2.75 25 0 -4
  [3,27,29,0,-9,25,0,-2.75,25,0,-4],
// 3 27 29 0 -9 25 0 -4 25 0 -5.25
  [3,27,29,0,-9,25,0,-4,25,0,-5.25],
// 3 27 29 0 -9 25 0 -5.25 25 0 -6.5
  [3,27,29,0,-9,25,0,-5.25,25,0,-6.5],
// 3 27 29 0 -9 25 0 -6.5 25 0 -7.75
  [3,27,29,0,-9,25,0,-6.5,25,0,-7.75],
// 3 27 29 0 -9 25 0 -7.75 25 0 -9
  [3,27,29,0,-9,25,0,-7.75,25,0,-9],
// 4 2 25 0 4.75 23.75 0 4.75 23.75 0 3.5 25 0 3.5
  [4,2,25,0,4.75,23.75,0,4.75,23.75,0,3.5,25,0,3.5],
// 4 2 25 0 2.25 23.75 0 2.25 23.75 0 1 25 0 1
  [4,2,25,0,2.25,23.75,0,2.25,23.75,0,1,25,0,1],
// 4 2 25 0 -0.25 23.75 0 -0.25 23.75 0 -1.5 25 0 -1.5
  [4,2,25,0,-0.25,23.75,0,-0.25,23.75,0,-1.5,25,0,-1.5],
// 4 2 25 0 -2.75 23.75 0 -2.75 23.75 0 -4 25 0 -4
  [4,2,25,0,-2.75,23.75,0,-2.75,23.75,0,-4,25,0,-4],
// 4 2 25 0 -5.25 23.75 0 -5.25 23.75 0 -6.5 25 0 -6.5
  [4,2,25,0,-5.25,23.75,0,-5.25,23.75,0,-6.5,25,0,-6.5],
// 4 2 25 0 -7.75 23.75 0 -7.75 23.75 0 -9 25 0 -9
  [4,2,25,0,-7.75,23.75,0,-7.75,23.75,0,-9,25,0,-9],
// 4 2 23.75 0 3.5 22.5 0 3.5 22.5 0 2.25 23.75 0 2.25
  [4,2,23.75,0,3.5,22.5,0,3.5,22.5,0,2.25,23.75,0,2.25],
// 4 2 23.75 0 1 22.5 0 1 22.5 0 -0.25 23.75 0 -0.25
  [4,2,23.75,0,1,22.5,0,1,22.5,0,-0.25,23.75,0,-0.25],
// 4 2 23.75 0 -1.5 22.5 0 -1.5 22.5 0 -2.75 23.75 0 -2.75
  [4,2,23.75,0,-1.5,22.5,0,-1.5,22.5,0,-2.75,23.75,0,-2.75],
// 4 2 23.75 0 -4 22.5 0 -4 22.5 0 -5.25 23.75 0 -5.25
  [4,2,23.75,0,-4,22.5,0,-4,22.5,0,-5.25,23.75,0,-5.25],
// 4 2 23.75 0 -6.5 22.5 0 -6.5 22.5 0 -7.75 23.75 0 -7.75
  [4,2,23.75,0,-6.5,22.5,0,-6.5,22.5,0,-7.75,23.75,0,-7.75],
// 4 2 22.5 0 4.75 21.25 0 4.75 21.25 0 3.5 22.5 0 3.5
  [4,2,22.5,0,4.75,21.25,0,4.75,21.25,0,3.5,22.5,0,3.5],
// 4 2 22.5 0 2.25 21.25 0 2.25 21.25 0 1 22.5 0 1
  [4,2,22.5,0,2.25,21.25,0,2.25,21.25,0,1,22.5,0,1],
// 4 2 22.5 0 -0.25 21.25 0 -0.25 21.25 0 -1.5 22.5 0 -1.5
  [4,2,22.5,0,-0.25,21.25,0,-0.25,21.25,0,-1.5,22.5,0,-1.5],
// 4 2 22.5 0 -2.75 21.25 0 -2.75 21.25 0 -4 22.5 0 -4
  [4,2,22.5,0,-2.75,21.25,0,-2.75,21.25,0,-4,22.5,0,-4],
// 4 2 22.5 0 -5.25 21.25 0 -5.25 21.25 0 -6.5 22.5 0 -6.5
  [4,2,22.5,0,-5.25,21.25,0,-5.25,21.25,0,-6.5,22.5,0,-6.5],
// 4 2 22.5 0 -7.75 21.25 0 -7.75 21.25 0 -9 22.5 0 -9
  [4,2,22.5,0,-7.75,21.25,0,-7.75,21.25,0,-9,22.5,0,-9],
// 4 2 21.25 0 3.5 20 0 3.5 20 0 2.25 21.25 0 2.25
  [4,2,21.25,0,3.5,20,0,3.5,20,0,2.25,21.25,0,2.25],
// 4 2 21.25 0 1 20 0 1 20 0 -0.25 21.25 0 -0.25
  [4,2,21.25,0,1,20,0,1,20,0,-0.25,21.25,0,-0.25],
// 4 2 21.25 0 -1.5 20 0 -1.5 20 0 -2.75 21.25 0 -2.75
  [4,2,21.25,0,-1.5,20,0,-1.5,20,0,-2.75,21.25,0,-2.75],
// 4 2 21.25 0 -4 20 0 -4 20 0 -5.25 21.25 0 -5.25
  [4,2,21.25,0,-4,20,0,-4,20,0,-5.25,21.25,0,-5.25],
// 4 2 21.25 0 -6.5 20 0 -6.5 20 0 -7.75 21.25 0 -7.75
  [4,2,21.25,0,-6.5,20,0,-6.5,20,0,-7.75,21.25,0,-7.75],
// 4 2 2 0 -9 2 0 4.75 0 0 6.75 0 0 -9
  [4,2,2,0,-9,2,0,4.75,0,0,6.75,0,0,-9],
// 4 2 2 0 4.75 5.5 0 4.75 5.5 0 6.75 0 0 6.75
  [4,2,2,0,4.75,5.5,0,4.75,5.5,0,6.75,0,0,6.75],
// 4 2 20 0 -9 20 0 -7.75 19.5 0 -7.75 19.5 0 -9
  [4,2,20,0,-9,20,0,-7.75,19.5,0,-7.75,19.5,0,-9],
// 4 2 20 0 -7.75 20 0 -6.5 19.5 0 -6.5 19.5 0 -7.75
  [4,2,20,0,-7.75,20,0,-6.5,19.5,0,-6.5,19.5,0,-7.75],
// 4 2 20 0 -6.5 20 0 -5.25 19.5 0 -5.25 19.5 0 -6.5
  [4,2,20,0,-6.5,20,0,-5.25,19.5,0,-5.25,19.5,0,-6.5],
// 4 2 20 0 -5.25 20 0 -4 19.5 0 -4 19.5 0 -5.25
  [4,2,20,0,-5.25,20,0,-4,19.5,0,-4,19.5,0,-5.25],
// 4 2 20 0 -4 20 0 -2.75 19.5 0 -2.75 19.5 0 -4
  [4,2,20,0,-4,20,0,-2.75,19.5,0,-2.75,19.5,0,-4],
// 4 2 20 0 -2.75 20 0 -1.5 19.5 0 -1.5 19.5 0 -2.75
  [4,2,20,0,-2.75,20,0,-1.5,19.5,0,-1.5,19.5,0,-2.75],
// 4 2 20 0 -1.5 20 0 -0.25 19.5 0 -0.25 19.5 0 -1.5
  [4,2,20,0,-1.5,20,0,-0.25,19.5,0,-0.25,19.5,0,-1.5],
// 4 2 20 0 -0.25 20 0 1 19.5 0 1 19.5 0 -0.25
  [4,2,20,0,-0.25,20,0,1,19.5,0,1,19.5,0,-0.25],
// 4 2 20 0 1 20 0 2.25 19.5 0 2.25 19.5 0 1
  [4,2,20,0,1,20,0,2.25,19.5,0,2.25,19.5,0,1],
// 4 2 20 0 2.25 20 0 3.5 19.5 0 3.5 19.5 0 2.25
  [4,2,20,0,2.25,20,0,3.5,19.5,0,3.5,19.5,0,2.25],
// 4 2 20 0 3.5 20 0 4.75 19.5 0 4.75 19.5 0 3.5
  [4,2,20,0,3.5,20,0,4.75,19.5,0,4.75,19.5,0,3.5],
// 4 2 5.5 0 4.75 5.5 0 -9 6 0 -9 6 0 4.75
  [4,2,5.5,0,4.75,5.5,0,-9,6,0,-9,6,0,4.75],
// 4 2 6 0 4.75 6 0 6 5.5 0 6.75 5.5 0 4.75
  [4,2,6,0,4.75,6,0,6,5.5,0,6.75,5.5,0,4.75],
// 4 2 25 0 4.75 29 0 4.75 29 0 6 19.5 0 6
  [4,2,25,0,4.75,29,0,4.75,29,0,6,19.5,0,6],
// 4 2 29 0 6.75 5.5 0 6.75 6 0 6 19.5 0 6
  [4,2,29,0,6.75,5.5,0,6.75,6,0,6,19.5,0,6],
// 4 2 -12.5 0 6 -12.5 0 -9 -12 0 -9 -12 0 6.75
  [4,2,-12.5,0,6,-12.5,0,-9,-12,0,-9,-12,0,6.75],
// 4 2 -15 0 4.75 -15 0 -9 -14.5 0 -9 -14.5 0 6
  [4,2,-15,0,4.75,-15,0,-9,-14.5,0,-9,-14.5,0,6],
// 4 2 -29 0 4.75 -15 0 4.75 -14.5 0 6 -29 0 6
  [4,2,-29,0,4.75,-15,0,4.75,-14.5,0,6,-29,0,6],
// 4 2 -14.5 0 6 -12 0 6.75 -29 0 6.75 -29 0 6
  [4,2,-14.5,0,6,-12,0,6.75,-29,0,6.75,-29,0,6],
// 4 10 19.5 0 4.75 19.5 0 6 6 0 6 6 0 4.75
  [4,10,19.5,0,4.75,19.5,0,6,6,0,6,6,0,4.75],
// 4 10 19.5 0 4.75 6 0 4.75 6 0 -9 19.5 0 3.5
  [4,10,19.5,0,4.75,6,0,4.75,6,0,-9,19.5,0,3.5],
// 4 10 -14.5 0 6 -14.5 0 -9 -12.5 0 -9 -12.5 0 6
  [4,10,-14.5,0,6,-14.5,0,-9,-12.5,0,-9,-12.5,0,6],
// 4 16 -29 0 4.75 -29 0 6 -30 0 10 -30 0 -10
  [4,16,-29,0,4.75,-29,0,6,-30,0,10,-30,0,-10],
// 4 16 29 0 9 30 0 10 -30 0 10 -29 0 9
  [4,16,29,0,9,30,0,10,-30,0,10,-29,0,9],
// 4 16 30 0 10 29 0 6 29 0 4.75 30 0 -10
  [4,16,30,0,10,29,0,6,29,0,4.75,30,0,-10],
// 4 16 30 0 -10 2 0 -9 0 0 -9 -30 0 -10
  [4,16,30,0,-10,2,0,-9,0,0,-9,-30,0,-10],
// 4 27 29 0 -9 29 0 4.75 25 0 4.75 25 0 3.5
  [4,27,29,0,-9,29,0,4.75,25,0,4.75,25,0,3.5],
// 4 27 25 0 3.5 23.75 0 3.5 23.75 0 2.25 25 0 2.25
  [4,27,25,0,3.5,23.75,0,3.5,23.75,0,2.25,25,0,2.25],
// 4 27 25 0 1 23.75 0 1 23.75 0 -0.25 25 0 -0.25
  [4,27,25,0,1,23.75,0,1,23.75,0,-0.25,25,0,-0.25],
// 4 27 25 0 -1.5 23.75 0 -1.5 23.75 0 -2.75 25 0 -2.75
  [4,27,25,0,-1.5,23.75,0,-1.5,23.75,0,-2.75,25,0,-2.75],
// 4 27 25 0 -4 23.75 0 -4 23.75 0 -5.25 25 0 -5.25
  [4,27,25,0,-4,23.75,0,-4,23.75,0,-5.25,25,0,-5.25],
// 4 27 25 0 -6.5 23.75 0 -6.5 23.75 0 -7.75 25 0 -7.75
  [4,27,25,0,-6.5,23.75,0,-6.5,23.75,0,-7.75,25,0,-7.75],
// 4 27 23.75 0 4.75 22.5 0 4.75 22.5 0 3.5 23.75 0 3.5
  [4,27,23.75,0,4.75,22.5,0,4.75,22.5,0,3.5,23.75,0,3.5],
// 4 27 23.75 0 2.25 22.5 0 2.25 22.5 0 1 23.75 0 1
  [4,27,23.75,0,2.25,22.5,0,2.25,22.5,0,1,23.75,0,1],
// 4 27 23.75 0 -0.25 22.5 0 -0.25 22.5 0 -1.5 23.75 0 -1.5
  [4,27,23.75,0,-0.25,22.5,0,-0.25,22.5,0,-1.5,23.75,0,-1.5],
// 4 27 23.75 0 -2.75 22.5 0 -2.75 22.5 0 -4 23.75 0 -4
  [4,27,23.75,0,-2.75,22.5,0,-2.75,22.5,0,-4,23.75,0,-4],
// 4 27 23.75 0 -5.25 22.5 0 -5.25 22.5 0 -6.5 23.75 0 -6.5
  [4,27,23.75,0,-5.25,22.5,0,-5.25,22.5,0,-6.5,23.75,0,-6.5],
// 4 27 23.75 0 -7.75 22.5 0 -7.75 22.5 0 -9 23.75 0 -9
  [4,27,23.75,0,-7.75,22.5,0,-7.75,22.5,0,-9,23.75,0,-9],
// 4 27 22.5 0 3.5 21.25 0 3.5 21.25 0 2.25 22.5 0 2.25
  [4,27,22.5,0,3.5,21.25,0,3.5,21.25,0,2.25,22.5,0,2.25],
// 4 27 22.5 0 1 21.25 0 1 21.25 0 -0.25 22.5 0 -0.25
  [4,27,22.5,0,1,21.25,0,1,21.25,0,-0.25,22.5,0,-0.25],
// 4 27 22.5 0 -1.5 21.25 0 -1.5 21.25 0 -2.75 22.5 0 -2.75
  [4,27,22.5,0,-1.5,21.25,0,-1.5,21.25,0,-2.75,22.5,0,-2.75],
// 4 27 22.5 0 -4 21.25 0 -4 21.25 0 -5.25 22.5 0 -5.25
  [4,27,22.5,0,-4,21.25,0,-4,21.25,0,-5.25,22.5,0,-5.25],
// 4 27 22.5 0 -6.5 21.25 0 -6.5 21.25 0 -7.75 22.5 0 -7.75
  [4,27,22.5,0,-6.5,21.25,0,-6.5,21.25,0,-7.75,22.5,0,-7.75],
// 4 27 21.25 0 4.75 20 0 4.75 20 0 3.5 21.25 0 3.5
  [4,27,21.25,0,4.75,20,0,4.75,20,0,3.5,21.25,0,3.5],
// 4 27 21.25 0 2.25 20 0 2.25 20 0 1 21.25 0 1
  [4,27,21.25,0,2.25,20,0,2.25,20,0,1,21.25,0,1],
// 4 27 21.25 0 -0.25 20 0 -0.25 20 0 -1.5 21.25 0 -1.5
  [4,27,21.25,0,-0.25,20,0,-0.25,20,0,-1.5,21.25,0,-1.5],
// 4 27 21.25 0 -2.75 20 0 -2.75 20 0 -4 21.25 0 -4
  [4,27,21.25,0,-2.75,20,0,-2.75,20,0,-4,21.25,0,-4],
// 4 27 21.25 0 -5.25 20 0 -5.25 20 0 -6.5 21.25 0 -6.5
  [4,27,21.25,0,-5.25,20,0,-5.25,20,0,-6.5,21.25,0,-6.5],
// 4 27 21.25 0 -7.75 20 0 -7.75 20 0 -9 21.25 0 -9
  [4,27,21.25,0,-7.75,20,0,-7.75,20,0,-9,21.25,0,-9],
// 4 27 5.5 0 -9 5.5 0 4.75 2 0 4.75 2 0 -9
  [4,27,5.5,0,-9,5.5,0,4.75,2,0,4.75,2,0,-9],
// 4 27 -15 0 -9 -15 0 4.75 -29 0 4.75 -29 0 -9
  [4,27,-15,0,-9,-15,0,4.75,-29,0,4.75,-29,0,-9],
// 4 27 0 0 -9 0 0 6.75 -12 0 6.75 -12 0 -9
  [4,27,0,0,-9,0,0,6.75,-12,0,6.75,-12,0,-9],
// 4 27 -29 0 9 -12 0 6.75 0 0 6.75 29 0 9
  [4,27,-29,0,9,-12,0,6.75,0,0,6.75,29,0,9],
];
module ldraw_lib__63864p08(step=0, col=false, unit=2/5, alt=false, line=0.2, solid=!$preview)
    makepoly(ldraw_lib__63864p08(), step=step, col=col, unit=unit, alt=alt, line=line, solid=solid);
ldraw_lib__63864p08(line=0.2);
